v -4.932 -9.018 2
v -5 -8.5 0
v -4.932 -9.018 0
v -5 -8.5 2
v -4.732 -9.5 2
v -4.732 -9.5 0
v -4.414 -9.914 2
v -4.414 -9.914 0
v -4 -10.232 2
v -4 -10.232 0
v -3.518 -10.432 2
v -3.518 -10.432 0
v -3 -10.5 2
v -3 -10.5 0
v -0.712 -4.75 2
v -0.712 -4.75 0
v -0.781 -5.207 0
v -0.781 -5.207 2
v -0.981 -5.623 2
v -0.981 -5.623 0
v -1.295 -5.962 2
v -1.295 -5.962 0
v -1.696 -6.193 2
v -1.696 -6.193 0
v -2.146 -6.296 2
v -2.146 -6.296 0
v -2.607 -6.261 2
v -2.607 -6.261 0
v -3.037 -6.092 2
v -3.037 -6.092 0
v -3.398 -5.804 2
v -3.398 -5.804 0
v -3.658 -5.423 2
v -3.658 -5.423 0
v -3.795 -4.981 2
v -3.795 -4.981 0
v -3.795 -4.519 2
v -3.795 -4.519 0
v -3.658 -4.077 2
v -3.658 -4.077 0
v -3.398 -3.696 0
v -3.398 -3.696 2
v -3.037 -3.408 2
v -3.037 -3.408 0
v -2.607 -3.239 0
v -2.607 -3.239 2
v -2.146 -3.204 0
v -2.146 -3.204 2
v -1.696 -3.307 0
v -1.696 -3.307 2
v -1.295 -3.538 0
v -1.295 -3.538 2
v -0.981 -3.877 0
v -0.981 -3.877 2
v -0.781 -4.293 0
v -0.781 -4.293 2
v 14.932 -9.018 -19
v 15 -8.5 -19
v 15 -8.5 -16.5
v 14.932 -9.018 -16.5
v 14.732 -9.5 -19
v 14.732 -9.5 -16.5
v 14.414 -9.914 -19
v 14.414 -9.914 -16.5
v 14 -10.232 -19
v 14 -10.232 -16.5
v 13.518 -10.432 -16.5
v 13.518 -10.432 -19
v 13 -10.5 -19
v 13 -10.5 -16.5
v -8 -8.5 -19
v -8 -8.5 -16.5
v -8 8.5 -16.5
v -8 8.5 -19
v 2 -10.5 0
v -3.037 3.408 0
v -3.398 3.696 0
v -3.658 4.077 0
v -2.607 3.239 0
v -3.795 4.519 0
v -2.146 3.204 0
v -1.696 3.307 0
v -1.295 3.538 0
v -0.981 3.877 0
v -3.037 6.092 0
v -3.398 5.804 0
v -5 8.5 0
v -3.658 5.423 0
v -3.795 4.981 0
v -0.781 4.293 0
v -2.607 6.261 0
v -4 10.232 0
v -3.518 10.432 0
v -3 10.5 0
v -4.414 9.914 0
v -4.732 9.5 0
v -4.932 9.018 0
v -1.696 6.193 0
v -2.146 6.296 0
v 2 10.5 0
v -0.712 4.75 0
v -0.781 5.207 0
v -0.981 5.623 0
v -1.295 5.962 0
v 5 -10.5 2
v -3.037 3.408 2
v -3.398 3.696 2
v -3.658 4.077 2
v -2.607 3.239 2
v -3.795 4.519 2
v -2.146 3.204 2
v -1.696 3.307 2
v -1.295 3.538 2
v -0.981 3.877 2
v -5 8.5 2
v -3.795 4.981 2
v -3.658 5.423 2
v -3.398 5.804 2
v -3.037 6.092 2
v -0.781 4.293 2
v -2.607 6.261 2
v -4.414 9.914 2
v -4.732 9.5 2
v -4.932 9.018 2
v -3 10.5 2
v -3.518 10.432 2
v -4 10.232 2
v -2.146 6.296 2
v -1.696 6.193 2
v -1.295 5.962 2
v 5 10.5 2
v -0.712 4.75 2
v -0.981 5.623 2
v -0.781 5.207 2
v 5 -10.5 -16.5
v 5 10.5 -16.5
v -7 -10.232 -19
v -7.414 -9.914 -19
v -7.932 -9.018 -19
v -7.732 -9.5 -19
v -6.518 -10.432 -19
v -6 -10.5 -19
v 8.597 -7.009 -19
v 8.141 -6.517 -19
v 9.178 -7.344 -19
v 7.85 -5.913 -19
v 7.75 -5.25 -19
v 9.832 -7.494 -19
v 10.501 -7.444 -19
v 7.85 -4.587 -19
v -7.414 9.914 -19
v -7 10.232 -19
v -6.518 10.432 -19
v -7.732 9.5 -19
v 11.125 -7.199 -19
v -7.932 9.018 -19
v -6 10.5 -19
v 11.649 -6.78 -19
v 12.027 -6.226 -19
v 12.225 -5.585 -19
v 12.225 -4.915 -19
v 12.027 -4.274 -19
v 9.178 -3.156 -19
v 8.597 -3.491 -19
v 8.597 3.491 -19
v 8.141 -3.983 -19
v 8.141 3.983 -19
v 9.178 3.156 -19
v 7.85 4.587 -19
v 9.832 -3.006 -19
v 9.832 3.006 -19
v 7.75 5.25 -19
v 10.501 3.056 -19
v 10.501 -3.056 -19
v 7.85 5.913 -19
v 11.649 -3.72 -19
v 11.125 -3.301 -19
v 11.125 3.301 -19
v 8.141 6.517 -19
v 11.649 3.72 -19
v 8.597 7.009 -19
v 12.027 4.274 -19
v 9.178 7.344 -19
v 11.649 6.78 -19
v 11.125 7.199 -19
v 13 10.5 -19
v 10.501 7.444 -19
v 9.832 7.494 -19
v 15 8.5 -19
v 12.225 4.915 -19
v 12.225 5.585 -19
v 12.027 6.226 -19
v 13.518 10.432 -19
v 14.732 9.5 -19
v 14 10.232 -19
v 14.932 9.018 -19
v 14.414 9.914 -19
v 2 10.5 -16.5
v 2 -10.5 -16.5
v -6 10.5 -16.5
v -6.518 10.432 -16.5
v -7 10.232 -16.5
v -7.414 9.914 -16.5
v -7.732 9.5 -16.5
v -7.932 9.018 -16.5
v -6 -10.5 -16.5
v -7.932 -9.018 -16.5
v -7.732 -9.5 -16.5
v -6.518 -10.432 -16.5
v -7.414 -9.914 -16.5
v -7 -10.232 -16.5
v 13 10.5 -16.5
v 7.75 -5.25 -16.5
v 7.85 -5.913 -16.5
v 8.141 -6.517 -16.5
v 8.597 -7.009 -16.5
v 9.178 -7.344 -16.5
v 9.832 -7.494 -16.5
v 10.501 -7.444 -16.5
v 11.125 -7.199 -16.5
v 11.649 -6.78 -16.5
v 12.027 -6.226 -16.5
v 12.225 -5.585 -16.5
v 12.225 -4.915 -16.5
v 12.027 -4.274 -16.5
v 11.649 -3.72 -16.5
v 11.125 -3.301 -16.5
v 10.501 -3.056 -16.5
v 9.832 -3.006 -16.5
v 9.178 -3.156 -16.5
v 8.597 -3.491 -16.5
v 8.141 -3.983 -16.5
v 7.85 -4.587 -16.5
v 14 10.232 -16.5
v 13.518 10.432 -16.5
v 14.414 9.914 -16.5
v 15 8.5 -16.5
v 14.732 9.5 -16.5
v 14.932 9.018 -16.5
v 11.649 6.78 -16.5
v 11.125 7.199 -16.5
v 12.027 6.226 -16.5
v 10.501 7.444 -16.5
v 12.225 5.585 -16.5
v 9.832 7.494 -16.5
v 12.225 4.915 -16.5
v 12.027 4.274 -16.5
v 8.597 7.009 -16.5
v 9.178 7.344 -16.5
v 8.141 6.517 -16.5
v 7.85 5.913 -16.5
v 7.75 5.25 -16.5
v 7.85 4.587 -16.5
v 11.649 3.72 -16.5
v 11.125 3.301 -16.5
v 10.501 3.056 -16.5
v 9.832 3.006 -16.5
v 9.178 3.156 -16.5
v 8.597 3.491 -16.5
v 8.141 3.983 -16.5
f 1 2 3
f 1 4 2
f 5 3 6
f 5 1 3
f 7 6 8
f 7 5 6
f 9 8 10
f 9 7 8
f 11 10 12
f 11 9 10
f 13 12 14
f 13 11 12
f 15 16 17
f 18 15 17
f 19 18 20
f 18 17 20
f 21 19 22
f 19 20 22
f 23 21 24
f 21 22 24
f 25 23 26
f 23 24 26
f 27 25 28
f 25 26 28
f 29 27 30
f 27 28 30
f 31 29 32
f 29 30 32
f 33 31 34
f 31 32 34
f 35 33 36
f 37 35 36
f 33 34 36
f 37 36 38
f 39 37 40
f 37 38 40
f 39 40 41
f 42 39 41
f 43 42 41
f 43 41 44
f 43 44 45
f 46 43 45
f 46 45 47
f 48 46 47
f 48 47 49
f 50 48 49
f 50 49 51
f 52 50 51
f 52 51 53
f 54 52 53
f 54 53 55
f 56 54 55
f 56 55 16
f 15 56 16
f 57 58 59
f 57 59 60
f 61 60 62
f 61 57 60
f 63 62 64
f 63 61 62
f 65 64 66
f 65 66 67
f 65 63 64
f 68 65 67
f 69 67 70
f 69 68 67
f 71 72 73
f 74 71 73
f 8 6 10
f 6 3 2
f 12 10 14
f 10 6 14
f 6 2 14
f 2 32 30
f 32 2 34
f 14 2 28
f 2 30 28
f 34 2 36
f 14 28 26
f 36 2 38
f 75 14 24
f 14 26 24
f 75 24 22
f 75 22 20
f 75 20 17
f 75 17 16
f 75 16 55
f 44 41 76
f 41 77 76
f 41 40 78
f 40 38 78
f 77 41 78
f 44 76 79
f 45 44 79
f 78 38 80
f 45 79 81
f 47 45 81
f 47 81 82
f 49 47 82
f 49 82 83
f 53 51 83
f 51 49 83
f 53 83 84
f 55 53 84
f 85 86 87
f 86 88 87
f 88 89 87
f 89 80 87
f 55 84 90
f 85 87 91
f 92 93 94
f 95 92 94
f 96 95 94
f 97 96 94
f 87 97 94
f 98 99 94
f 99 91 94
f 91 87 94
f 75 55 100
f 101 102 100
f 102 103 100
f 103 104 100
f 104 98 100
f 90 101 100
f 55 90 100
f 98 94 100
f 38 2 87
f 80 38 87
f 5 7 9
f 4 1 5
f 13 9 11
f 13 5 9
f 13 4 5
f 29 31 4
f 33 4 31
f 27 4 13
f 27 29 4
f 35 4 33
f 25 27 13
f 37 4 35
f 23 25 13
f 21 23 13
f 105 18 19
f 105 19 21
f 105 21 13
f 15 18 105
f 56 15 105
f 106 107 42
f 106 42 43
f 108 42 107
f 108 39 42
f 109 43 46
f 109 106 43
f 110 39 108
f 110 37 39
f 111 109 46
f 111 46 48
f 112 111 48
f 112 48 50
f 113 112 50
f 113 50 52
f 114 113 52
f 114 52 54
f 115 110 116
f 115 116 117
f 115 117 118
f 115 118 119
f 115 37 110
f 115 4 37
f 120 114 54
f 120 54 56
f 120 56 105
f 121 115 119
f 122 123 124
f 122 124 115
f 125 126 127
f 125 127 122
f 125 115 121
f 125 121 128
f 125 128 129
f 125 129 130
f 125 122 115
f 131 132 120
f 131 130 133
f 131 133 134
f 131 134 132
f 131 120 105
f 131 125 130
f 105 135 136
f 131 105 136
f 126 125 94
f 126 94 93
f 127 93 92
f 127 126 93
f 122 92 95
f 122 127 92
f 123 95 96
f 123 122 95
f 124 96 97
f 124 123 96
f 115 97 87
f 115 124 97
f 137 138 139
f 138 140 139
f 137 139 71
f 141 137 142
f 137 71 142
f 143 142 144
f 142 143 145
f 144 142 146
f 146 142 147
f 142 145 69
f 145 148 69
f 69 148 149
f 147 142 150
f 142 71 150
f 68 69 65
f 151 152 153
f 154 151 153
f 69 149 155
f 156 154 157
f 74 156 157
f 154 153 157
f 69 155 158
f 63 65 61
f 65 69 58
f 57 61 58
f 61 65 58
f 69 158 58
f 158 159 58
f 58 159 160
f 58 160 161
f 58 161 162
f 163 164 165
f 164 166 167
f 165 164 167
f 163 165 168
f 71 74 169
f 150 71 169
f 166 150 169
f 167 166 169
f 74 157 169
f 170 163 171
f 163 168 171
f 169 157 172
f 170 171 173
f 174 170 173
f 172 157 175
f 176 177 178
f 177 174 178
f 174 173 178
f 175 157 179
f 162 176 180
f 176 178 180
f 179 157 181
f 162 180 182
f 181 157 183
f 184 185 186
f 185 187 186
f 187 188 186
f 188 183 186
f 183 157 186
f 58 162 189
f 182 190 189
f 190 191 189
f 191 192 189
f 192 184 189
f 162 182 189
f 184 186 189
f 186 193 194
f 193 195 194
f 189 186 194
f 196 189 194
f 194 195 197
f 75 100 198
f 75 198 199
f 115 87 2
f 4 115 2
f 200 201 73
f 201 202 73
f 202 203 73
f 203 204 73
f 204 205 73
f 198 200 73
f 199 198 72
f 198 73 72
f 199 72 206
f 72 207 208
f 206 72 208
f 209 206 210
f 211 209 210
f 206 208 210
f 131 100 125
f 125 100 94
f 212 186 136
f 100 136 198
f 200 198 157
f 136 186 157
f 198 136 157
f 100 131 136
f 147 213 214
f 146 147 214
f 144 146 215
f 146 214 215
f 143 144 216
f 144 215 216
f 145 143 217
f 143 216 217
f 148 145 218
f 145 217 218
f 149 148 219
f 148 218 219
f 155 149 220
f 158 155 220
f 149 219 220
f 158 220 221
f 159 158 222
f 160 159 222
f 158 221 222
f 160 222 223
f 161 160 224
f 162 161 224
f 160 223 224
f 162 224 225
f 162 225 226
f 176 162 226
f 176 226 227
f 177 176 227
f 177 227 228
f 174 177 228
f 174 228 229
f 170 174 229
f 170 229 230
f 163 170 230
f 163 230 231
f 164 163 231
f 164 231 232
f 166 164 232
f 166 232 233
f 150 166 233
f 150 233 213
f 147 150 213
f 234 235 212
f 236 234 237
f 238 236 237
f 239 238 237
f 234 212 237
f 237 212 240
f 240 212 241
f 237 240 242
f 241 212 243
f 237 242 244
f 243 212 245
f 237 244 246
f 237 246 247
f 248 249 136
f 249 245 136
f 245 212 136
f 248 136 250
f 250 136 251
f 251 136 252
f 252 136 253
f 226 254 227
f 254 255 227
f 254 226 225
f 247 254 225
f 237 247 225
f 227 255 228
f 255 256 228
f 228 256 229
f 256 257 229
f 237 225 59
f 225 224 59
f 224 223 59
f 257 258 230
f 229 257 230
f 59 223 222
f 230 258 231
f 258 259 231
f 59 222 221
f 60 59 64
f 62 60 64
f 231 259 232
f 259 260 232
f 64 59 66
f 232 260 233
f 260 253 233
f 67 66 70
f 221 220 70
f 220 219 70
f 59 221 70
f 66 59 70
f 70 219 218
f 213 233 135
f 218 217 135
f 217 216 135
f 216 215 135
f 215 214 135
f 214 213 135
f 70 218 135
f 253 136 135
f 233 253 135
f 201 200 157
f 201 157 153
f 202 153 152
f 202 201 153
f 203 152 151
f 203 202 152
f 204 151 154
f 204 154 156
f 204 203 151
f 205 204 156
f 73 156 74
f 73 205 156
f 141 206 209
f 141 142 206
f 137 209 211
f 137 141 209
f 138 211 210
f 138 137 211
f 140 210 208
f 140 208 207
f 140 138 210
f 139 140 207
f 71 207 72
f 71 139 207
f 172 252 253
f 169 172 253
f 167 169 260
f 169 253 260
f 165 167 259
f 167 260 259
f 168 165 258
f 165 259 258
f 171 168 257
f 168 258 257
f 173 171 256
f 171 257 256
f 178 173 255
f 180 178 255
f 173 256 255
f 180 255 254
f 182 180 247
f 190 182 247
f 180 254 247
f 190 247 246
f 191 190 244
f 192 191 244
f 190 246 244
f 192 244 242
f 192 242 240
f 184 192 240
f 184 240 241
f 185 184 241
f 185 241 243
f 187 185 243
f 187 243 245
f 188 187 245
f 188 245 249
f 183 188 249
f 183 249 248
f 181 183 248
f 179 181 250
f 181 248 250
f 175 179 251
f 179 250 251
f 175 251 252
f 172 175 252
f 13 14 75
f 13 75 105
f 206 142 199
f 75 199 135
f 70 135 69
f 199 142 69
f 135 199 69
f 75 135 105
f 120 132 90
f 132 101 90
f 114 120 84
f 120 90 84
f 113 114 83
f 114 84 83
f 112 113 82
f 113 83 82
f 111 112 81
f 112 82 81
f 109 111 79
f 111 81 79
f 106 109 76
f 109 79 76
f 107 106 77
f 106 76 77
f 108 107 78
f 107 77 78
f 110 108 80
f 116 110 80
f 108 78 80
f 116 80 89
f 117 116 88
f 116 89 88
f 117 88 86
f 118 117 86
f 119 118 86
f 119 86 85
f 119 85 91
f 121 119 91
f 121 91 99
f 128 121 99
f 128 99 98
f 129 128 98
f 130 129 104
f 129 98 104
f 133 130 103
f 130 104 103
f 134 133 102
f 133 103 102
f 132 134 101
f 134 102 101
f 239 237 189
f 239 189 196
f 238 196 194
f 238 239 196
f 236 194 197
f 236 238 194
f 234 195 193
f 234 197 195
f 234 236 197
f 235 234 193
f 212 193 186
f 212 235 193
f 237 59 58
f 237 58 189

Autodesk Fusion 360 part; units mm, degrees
sketch "Sketch1" plane through (0, 0, 0) normal (0, 0, 1) x (1, 0, 0)
  line L0 (5, 10.5) -> (-5, 10.5)
  line L1 (-5, 10.5) -> (-5, -10.5)
  line L2 (-5, -10.5) -> (5, -10.5)
  line L3 (5, -10.5) -> (5, 10.5)
  line L4 (5, 10.5) -> (-5, -10.5) construction
  line L5 (-5, 10.5) -> (5, -10.5) construction
  line L6 (5, -4.75) -> (-5, -4.75)
  line L7 (-5, -4.75) -> (-5, 4.75)
  line L8 (-5, 4.75) -> (5, 4.75)
  line L9 (5, 4.75) -> (5, -4.75)
  line L10 (5, -4.75) -> (-5, 4.75) construction
  line L11 (-5, -4.75) -> (5, 4.75) construction
  circle A0 centre (-2.2619, 4.75) radius 1.55
  circle A1 centre (-2.2619, -4.75) radius 1.55
  line L12 (5, 10.5) -> (2, 10.5)
  line L13 (2, 10.5) -> (2, -10.5)
  line L14 (2, -10.5) -> (5, -10.5)
  line L15 (5, -10.5) -> (5, 10.5)
  dimension "d1" = 10
  dimension "d2" = 21
  dimension "d3" = 10
  dimension "d4" = 9.5
  dimension "d5" = 3.1
  dimension "d6" = 3.1
  dimension "d7" = 3
extrude "Extrude1" add sketch "Sketch1" along normal blind 2 contours L0 L3 L8 L12 L13 L15 | L0 L1 L8 A0 L13 | L3 L6 L8 L9 L13 L15 | L1 L6 L7 L8 A0 A1 L13 | L2 L3 L6 L13 L14 L15 | L1 L2 L6 A1 L13
extrude "Extrude2" add sketch "Sketch1" against normal blind 19 contours L0 L3 L8 L12 L13 L15 | L3 L6 L8 L9 L13 L15 | L2 L3 L6 L13 L14 L15
sketch "Sketch2" plane through (5, 0, 0) normal (1, 0, 0) x (0, 1, 0)
  line L0 (10.5, -19) -> (10.5, 2)
  line L1 (10.5, 2) -> (-10.5, 2)
  line L2 (-10.5, 2) -> (-10.5, -19)
  line L3 (-10.5, -19) -> (10.5, -19)
  line L4 (-10.5, -19) -> (10.5, -19)
  line L5 (10.5, -19) -> (10.5, -16.5)
  line L6 (10.5, -16.5) -> (-10.5, -16.5)
  line L7 (-10.5, -16.5) -> (-10.5, -19)
  dimension "d12" = 2.5
extrude "Extrude3" add sketch "Sketch2" along normal blind 10 and the other way blind 13 contours L0 L2 L3 L4 L5 L6 L7
sketch "Sketch3" plane through (0, 0, -16.5) normal (0, 0, 1) x (-1, 0, 0)
  line L0 (-5, -10.5) -> (-5, 10.5)
  line L1 (-5, 10.5) -> (-15, 10.5)
  line L2 (-15, 10.5) -> (-15, -10.5)
  line L3 (-15, -10.5) -> (-5, -10.5)
  line L4 (-10, -10.5) -> (-10, 10.5)
  line L5 (-15, 0) -> (-5, 0)
  line L6 (-10, 0) -> (-10, -10.5)
  circle A0 centre (-10, -5.25) radius 2.25
  line L7 (-10, 0) -> (-10, 10.5)
  circle A1 centre (-10, 5.25) radius 2.25
  dimension "d17" = 4.5
  dimension "d18" = 4.5
fillet "Fillet1" radius 2 6 edges at (15, -10.5, -17.75) (15, 10.5, -17.75) (-8, -10.5, -17.75) (-5, -10.5, 1) (-5, 10.5, 1) (-8, 10.5, -17.75)
extrude "Extrude4" cut sketch "Sketch3" against normal blind 7 contours L4 L6 A0 | L4 L6 A0 | L4 L7 A1 | L4 L7 A1
